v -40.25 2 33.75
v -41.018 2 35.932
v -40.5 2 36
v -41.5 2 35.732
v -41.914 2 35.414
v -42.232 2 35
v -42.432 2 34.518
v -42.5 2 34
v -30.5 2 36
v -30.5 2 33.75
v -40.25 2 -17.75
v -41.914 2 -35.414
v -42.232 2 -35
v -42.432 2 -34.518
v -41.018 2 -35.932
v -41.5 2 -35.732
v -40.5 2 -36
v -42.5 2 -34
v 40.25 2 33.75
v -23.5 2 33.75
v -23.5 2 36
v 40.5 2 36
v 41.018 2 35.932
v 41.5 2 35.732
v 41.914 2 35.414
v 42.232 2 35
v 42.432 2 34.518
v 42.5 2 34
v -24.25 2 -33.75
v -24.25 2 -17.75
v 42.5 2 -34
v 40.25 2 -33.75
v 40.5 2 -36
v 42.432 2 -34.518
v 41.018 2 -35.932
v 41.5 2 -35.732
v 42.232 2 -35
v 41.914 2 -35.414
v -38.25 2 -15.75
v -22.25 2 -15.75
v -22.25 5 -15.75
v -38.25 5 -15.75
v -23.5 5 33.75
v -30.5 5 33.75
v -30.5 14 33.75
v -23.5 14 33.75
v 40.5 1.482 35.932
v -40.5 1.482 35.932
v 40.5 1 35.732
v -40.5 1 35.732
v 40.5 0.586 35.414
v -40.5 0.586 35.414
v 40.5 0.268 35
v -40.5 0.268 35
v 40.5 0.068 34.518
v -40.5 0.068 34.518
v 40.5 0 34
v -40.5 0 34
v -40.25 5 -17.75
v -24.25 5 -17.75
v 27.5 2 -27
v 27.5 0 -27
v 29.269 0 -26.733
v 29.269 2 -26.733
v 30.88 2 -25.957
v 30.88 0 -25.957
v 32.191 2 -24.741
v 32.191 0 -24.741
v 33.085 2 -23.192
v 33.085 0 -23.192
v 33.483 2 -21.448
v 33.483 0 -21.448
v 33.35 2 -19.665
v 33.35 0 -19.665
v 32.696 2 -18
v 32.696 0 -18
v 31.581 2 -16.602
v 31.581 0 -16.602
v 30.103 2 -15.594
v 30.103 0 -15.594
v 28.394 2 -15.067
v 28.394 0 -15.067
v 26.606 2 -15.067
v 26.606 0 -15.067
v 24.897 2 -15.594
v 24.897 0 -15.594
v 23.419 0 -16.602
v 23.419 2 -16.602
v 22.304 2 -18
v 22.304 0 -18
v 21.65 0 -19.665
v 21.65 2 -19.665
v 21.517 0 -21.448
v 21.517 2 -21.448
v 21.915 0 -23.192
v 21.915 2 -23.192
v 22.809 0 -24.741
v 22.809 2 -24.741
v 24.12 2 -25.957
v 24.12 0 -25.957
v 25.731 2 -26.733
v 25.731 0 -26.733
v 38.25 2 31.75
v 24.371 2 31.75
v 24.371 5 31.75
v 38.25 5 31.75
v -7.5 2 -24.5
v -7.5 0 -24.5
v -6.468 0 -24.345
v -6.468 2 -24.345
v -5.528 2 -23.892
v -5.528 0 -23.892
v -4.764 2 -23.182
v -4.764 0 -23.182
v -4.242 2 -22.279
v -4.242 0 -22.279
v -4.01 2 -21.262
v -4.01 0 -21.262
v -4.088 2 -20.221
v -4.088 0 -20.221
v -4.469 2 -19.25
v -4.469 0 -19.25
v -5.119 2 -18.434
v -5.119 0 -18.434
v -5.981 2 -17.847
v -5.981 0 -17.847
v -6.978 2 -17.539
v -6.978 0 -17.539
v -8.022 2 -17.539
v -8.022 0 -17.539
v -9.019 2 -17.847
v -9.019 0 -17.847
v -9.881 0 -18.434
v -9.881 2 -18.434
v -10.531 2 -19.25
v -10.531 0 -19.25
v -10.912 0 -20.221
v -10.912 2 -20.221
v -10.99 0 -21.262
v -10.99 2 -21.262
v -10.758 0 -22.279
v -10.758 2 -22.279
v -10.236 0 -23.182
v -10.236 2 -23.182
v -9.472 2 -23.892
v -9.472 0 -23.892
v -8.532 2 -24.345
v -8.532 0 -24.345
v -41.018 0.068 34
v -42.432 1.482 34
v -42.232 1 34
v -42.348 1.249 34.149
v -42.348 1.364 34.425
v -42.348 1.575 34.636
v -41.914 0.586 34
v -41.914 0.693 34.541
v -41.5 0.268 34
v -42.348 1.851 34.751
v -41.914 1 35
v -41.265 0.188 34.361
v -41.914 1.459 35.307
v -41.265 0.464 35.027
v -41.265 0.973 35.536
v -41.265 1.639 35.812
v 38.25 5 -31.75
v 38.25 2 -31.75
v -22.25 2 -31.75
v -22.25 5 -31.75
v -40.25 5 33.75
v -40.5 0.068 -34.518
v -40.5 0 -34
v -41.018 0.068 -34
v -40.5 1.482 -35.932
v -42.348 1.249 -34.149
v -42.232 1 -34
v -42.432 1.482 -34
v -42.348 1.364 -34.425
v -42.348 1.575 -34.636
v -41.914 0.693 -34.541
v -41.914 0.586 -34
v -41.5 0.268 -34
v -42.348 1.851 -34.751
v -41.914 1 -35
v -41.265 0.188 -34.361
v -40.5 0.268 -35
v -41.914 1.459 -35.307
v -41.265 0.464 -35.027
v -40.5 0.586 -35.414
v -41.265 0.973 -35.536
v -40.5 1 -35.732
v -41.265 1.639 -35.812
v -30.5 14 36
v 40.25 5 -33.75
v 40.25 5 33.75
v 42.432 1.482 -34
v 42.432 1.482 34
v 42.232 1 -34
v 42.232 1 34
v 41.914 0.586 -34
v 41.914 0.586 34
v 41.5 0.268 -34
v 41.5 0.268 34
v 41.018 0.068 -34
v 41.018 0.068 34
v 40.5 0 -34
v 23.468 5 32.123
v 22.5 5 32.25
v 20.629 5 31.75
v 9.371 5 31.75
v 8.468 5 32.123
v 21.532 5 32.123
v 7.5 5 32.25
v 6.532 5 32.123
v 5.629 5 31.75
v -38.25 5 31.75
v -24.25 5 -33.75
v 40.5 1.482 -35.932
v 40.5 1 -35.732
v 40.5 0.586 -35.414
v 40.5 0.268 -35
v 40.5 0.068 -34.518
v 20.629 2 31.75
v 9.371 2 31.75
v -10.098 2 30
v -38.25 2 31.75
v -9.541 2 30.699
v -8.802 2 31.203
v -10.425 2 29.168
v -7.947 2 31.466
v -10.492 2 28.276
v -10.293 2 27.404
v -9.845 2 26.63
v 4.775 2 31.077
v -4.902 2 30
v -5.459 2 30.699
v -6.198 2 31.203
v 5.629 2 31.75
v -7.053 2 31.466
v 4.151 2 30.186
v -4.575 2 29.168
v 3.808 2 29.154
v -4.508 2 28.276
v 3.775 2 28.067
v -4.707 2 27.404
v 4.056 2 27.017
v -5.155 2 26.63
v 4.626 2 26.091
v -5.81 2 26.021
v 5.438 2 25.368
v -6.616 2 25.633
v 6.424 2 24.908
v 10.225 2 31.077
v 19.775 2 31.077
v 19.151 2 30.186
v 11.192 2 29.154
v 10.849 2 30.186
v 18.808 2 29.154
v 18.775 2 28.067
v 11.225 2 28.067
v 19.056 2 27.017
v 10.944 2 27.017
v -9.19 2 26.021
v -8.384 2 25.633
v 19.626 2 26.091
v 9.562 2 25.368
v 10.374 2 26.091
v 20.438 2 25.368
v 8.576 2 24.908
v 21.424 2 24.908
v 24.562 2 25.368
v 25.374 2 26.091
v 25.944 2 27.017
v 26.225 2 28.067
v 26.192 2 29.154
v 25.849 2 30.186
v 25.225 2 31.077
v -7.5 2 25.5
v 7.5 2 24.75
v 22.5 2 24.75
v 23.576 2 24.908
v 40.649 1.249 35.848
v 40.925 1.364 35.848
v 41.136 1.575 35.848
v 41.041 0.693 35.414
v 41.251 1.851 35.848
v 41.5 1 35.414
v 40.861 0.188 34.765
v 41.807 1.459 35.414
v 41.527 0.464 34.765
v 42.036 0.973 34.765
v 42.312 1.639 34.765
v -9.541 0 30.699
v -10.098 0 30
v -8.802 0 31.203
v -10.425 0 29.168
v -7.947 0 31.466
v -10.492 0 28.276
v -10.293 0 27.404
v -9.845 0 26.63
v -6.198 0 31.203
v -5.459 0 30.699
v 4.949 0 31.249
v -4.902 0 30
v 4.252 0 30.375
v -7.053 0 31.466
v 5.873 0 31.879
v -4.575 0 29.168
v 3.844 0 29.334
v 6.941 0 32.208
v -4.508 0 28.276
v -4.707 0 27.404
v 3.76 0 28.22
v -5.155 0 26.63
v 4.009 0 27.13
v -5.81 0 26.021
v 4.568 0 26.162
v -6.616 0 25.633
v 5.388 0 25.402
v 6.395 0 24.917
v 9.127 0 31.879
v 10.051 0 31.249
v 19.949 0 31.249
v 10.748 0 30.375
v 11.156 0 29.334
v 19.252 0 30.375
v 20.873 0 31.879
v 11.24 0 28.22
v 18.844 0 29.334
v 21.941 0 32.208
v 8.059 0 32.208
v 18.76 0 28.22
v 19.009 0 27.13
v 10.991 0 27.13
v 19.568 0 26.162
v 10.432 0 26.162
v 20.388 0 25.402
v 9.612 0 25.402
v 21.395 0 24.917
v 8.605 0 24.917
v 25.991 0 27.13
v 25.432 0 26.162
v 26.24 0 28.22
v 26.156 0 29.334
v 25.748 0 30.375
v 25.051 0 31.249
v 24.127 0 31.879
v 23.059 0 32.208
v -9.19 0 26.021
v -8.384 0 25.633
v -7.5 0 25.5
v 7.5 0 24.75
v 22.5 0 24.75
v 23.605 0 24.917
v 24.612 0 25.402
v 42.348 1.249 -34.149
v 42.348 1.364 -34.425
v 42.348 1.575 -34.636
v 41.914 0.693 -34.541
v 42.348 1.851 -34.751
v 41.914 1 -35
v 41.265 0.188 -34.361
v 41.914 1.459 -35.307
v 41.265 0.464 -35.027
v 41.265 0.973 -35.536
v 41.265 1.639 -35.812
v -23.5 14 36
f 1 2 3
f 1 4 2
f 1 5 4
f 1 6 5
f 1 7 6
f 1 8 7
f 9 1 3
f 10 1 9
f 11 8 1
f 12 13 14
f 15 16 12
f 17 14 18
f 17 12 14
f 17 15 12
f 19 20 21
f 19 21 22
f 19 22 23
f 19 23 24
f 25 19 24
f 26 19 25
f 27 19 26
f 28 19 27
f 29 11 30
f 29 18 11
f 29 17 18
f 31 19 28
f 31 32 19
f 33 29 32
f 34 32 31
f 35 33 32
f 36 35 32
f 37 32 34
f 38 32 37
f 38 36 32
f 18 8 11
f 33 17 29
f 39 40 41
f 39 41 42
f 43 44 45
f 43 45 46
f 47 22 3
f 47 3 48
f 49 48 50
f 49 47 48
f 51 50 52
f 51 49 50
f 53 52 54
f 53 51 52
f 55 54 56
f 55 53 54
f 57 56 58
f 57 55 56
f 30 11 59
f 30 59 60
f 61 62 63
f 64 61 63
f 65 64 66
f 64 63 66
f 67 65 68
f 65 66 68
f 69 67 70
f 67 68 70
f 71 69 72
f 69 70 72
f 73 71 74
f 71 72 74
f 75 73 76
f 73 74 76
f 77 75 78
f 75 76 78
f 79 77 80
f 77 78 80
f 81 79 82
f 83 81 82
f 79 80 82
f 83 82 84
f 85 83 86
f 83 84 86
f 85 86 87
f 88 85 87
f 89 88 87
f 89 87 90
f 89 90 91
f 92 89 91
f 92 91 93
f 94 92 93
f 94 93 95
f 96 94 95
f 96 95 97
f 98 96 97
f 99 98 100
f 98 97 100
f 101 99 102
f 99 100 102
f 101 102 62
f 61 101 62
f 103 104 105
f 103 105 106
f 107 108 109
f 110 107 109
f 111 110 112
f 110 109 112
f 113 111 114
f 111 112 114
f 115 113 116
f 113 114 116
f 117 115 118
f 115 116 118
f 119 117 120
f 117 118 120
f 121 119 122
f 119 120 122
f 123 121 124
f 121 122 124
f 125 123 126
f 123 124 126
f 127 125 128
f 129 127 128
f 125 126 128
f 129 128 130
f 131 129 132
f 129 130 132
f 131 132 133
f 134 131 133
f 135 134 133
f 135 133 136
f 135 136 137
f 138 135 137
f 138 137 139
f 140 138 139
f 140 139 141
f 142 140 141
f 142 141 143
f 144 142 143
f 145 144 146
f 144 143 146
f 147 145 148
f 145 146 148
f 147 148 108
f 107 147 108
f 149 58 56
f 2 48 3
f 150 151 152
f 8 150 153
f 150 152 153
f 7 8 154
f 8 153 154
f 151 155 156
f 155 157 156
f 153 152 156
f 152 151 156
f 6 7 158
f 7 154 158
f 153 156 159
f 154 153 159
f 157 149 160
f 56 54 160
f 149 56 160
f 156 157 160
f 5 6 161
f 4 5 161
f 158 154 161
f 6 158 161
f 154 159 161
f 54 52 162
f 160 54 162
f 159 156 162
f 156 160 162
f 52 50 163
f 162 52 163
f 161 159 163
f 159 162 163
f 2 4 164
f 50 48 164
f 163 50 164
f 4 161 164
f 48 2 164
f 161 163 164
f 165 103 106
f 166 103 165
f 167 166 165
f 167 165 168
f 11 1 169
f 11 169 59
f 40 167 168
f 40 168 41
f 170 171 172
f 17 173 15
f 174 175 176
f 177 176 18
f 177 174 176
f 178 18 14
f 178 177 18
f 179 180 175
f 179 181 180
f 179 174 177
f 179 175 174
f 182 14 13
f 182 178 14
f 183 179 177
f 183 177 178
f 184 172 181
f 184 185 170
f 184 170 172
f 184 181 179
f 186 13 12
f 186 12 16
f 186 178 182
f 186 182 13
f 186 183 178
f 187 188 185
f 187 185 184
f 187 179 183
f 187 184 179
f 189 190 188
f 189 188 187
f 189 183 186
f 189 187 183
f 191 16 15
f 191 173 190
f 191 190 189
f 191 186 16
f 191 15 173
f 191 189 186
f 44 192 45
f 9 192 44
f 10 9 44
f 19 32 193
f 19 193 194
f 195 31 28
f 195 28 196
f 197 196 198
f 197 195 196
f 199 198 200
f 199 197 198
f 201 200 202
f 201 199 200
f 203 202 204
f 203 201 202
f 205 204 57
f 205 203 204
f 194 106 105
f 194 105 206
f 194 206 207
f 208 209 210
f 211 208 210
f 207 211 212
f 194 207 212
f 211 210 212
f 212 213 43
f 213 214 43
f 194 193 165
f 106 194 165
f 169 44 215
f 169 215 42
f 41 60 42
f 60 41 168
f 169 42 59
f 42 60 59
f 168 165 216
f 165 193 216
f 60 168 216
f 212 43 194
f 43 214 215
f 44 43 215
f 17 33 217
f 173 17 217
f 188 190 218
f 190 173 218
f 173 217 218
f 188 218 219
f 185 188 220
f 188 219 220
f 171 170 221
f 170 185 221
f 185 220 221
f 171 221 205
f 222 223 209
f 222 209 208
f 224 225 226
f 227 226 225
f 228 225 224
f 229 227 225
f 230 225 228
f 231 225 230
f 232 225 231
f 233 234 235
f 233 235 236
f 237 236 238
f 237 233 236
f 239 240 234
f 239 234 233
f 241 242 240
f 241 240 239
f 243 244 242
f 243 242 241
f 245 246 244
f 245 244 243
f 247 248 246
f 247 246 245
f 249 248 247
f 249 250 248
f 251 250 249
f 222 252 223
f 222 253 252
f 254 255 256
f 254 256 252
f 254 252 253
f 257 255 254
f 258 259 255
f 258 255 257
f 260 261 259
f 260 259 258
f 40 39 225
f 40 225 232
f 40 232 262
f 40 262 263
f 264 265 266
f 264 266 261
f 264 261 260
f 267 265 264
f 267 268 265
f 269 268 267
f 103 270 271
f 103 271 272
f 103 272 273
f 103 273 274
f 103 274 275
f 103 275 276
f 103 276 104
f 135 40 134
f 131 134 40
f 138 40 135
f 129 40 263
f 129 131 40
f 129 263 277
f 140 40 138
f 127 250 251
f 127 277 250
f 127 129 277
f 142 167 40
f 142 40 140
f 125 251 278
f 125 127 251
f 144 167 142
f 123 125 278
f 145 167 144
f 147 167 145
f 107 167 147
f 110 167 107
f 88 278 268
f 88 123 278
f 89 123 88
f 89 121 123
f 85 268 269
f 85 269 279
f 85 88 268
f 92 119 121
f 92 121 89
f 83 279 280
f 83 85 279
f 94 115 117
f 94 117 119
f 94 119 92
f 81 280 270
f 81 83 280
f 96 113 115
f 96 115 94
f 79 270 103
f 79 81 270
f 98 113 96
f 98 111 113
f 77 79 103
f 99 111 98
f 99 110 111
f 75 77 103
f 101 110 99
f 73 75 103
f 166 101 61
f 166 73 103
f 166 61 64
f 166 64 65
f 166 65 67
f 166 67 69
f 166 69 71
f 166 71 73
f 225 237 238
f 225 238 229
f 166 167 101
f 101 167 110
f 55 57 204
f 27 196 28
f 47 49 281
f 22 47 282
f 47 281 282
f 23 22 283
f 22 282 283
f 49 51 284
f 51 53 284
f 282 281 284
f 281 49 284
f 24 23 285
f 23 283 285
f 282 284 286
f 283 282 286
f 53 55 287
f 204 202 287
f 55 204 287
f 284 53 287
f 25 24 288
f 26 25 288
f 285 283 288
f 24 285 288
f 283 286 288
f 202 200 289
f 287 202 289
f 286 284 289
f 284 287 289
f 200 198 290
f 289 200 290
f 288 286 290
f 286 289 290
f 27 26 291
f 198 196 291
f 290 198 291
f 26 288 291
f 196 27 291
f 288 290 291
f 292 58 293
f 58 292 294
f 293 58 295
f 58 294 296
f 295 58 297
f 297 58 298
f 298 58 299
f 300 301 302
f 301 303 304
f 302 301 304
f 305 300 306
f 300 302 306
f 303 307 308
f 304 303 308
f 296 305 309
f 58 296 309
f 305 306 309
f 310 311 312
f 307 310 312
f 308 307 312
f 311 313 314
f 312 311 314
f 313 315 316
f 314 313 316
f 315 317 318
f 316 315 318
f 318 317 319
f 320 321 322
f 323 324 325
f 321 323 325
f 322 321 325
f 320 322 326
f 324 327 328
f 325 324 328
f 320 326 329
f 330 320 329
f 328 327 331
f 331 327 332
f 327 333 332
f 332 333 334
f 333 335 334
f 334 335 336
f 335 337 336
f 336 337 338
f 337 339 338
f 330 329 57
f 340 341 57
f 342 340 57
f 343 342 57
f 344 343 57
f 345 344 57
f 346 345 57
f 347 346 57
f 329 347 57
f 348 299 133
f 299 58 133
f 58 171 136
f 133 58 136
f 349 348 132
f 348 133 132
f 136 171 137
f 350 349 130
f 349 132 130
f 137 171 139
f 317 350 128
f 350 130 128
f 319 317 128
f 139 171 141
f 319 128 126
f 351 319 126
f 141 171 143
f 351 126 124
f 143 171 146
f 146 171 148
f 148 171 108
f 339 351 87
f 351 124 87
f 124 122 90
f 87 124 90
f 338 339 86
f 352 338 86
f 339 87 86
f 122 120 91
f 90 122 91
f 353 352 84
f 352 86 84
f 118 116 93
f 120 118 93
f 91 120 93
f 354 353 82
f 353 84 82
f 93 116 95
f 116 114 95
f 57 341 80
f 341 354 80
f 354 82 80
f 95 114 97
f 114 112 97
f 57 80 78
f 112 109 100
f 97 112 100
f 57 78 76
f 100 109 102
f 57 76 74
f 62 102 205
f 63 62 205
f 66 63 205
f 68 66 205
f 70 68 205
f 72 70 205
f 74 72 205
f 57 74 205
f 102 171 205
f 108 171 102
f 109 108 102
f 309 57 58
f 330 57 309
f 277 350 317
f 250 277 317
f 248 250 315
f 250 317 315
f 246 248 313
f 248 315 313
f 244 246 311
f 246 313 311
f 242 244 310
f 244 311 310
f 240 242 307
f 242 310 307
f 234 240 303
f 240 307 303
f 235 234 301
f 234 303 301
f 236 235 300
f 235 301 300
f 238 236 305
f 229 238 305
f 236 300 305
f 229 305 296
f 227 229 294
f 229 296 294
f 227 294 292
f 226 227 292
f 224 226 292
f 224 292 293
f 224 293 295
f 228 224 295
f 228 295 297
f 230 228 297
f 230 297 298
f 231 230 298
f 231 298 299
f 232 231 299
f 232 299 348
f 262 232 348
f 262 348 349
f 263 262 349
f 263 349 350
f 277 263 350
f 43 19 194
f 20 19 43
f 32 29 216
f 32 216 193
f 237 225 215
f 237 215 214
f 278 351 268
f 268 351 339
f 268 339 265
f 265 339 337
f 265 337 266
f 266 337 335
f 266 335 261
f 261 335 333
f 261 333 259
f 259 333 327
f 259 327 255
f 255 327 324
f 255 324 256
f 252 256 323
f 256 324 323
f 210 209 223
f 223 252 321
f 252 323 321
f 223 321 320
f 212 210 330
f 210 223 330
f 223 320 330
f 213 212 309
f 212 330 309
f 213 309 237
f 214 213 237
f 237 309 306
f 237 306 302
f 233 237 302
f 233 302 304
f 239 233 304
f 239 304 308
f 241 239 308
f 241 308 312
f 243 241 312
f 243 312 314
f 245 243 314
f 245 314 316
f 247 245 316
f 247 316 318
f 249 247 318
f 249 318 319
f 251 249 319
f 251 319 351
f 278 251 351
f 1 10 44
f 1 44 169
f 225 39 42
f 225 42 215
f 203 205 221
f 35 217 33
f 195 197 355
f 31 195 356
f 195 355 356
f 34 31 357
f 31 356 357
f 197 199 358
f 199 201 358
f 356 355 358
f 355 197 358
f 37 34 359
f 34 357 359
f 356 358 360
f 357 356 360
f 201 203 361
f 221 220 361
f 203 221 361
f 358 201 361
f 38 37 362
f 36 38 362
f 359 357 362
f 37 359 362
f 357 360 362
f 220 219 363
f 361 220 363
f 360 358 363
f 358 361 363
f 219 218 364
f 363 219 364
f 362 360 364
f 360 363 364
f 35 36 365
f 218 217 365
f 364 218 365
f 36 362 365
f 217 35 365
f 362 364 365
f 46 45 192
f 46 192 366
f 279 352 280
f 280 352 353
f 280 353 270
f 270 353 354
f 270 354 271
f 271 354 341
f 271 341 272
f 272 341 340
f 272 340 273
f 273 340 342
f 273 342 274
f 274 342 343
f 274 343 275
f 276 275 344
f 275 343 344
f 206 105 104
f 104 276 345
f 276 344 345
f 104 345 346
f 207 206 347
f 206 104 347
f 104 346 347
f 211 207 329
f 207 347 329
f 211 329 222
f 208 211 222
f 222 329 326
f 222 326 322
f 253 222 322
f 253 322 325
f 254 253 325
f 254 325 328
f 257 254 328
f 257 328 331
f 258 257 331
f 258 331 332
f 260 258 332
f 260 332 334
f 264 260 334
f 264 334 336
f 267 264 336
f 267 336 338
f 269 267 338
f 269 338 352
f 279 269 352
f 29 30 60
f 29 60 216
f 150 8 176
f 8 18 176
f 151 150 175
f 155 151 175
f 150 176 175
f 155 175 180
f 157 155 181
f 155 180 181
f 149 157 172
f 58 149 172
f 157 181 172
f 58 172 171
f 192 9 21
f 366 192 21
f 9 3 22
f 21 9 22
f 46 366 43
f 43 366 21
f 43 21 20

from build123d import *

# Parameters (mm, degrees)
ESQUISSE1_W             = 85
ESQUISSE1_H             = 72
BOSS_EXTRU_1_DEPTH      = 2
BOSS_EXTRU_2_DEPTH      = 3
ESQUISSE3_R             = 3.75
ESQUISSE3_R_2           = 3
ENL_V_MAT_EXTRU_1_DEPTH = 56.921820428
ESQUISSE4_R             = 6
ESQUISSE4_R_2           = 3.5
ENL_V_MAT_EXTRU_2_DEPTH = 2
ESQUISSE8_W             = 7
ESQUISSE8_H             = 2.25
BOSS_EXTRU_4_DEPTH      = 12
CONG_4_R                = 2


with BuildPart() as part:
    # Esquisse1 → Boss.-Extru.1 (new body)
    with BuildSketch(Plane(origin=(0, 0, 0), x_dir=(1, 0, 0), z_dir=(0, 1, 0))):
        Rectangle(ESQUISSE1_W, ESQUISSE1_H)
    extrude(amount=BOSS_EXTRU_1_DEPTH)

    # Esquisse2 → Boss.-Extru.2 (add)
    with BuildSketch(Plane(origin=(0, 2, 0), x_dir=(1, 0, 0), z_dir=(0, 1, 0))):
        Polygon((40.25, -33.75), (-40.25, -33.75), (-40.25, 17.75), (-24.25, 17.75), (-24.25, 33.75), (40.25, 33.75), align=None)
        Polygon((-38.25, -31.75), (38.25, -31.75), (38.25, 31.75), (-22.25, 31.75), (-22.25, 15.75), (-38.25, 15.75), align=None, mode=Mode.SUBTRACT)
    extrude(amount=BOSS_EXTRU_2_DEPTH)

    # Esquisse3 → Enlèv. mat.-Extru.1 (cut, through all)
    with BuildSketch(Plane(origin=(0, 0, 0), x_dir=(-1, 0, 0), z_dir=(0, -1, 0))):
        with Locations(Location((-22.5, -28.5, 0), (0, 0, 90))):
            Circle(ESQUISSE3_R)
        with Locations(Location((-7.5, -28.5, 0), (0, 0, 90))):
            Circle(ESQUISSE3_R)
        with Locations(Location((7.5, -28.5, 0), (0, 0, 90))):
            Circle(ESQUISSE3_R_2)
    extrude(amount=-ENL_V_MAT_EXTRU_1_DEPTH, mode=Mode.SUBTRACT)

    # Esquisse4 → Enlèv. mat.-Extru.2 (cut)
    with BuildSketch(Plane(origin=(0, 0, 0), x_dir=(-1, 0, 0), z_dir=(0, -1, 0))):
        with Locations(Location((-27.5, 21, 0), (0, 0, 90))):
            Circle(ESQUISSE4_R)
        with Locations(Location((7.5, 21, 0), (0, 0, 90))):
            Circle(ESQUISSE4_R_2)
    extrude(amount=-ENL_V_MAT_EXTRU_2_DEPTH, mode=Mode.SUBTRACT)

    # Esquisse8 → Boss.-Extru.4 (add)
    with BuildSketch(Plane(origin=(0, 2, 0), x_dir=(1, 0, 0), z_dir=(0, 1, 0))):
        with Locations((-27, -34.875)):
            Rectangle(ESQUISSE8_W, ESQUISSE8_H)
    extrude(amount=BOSS_EXTRU_4_DEPTH)

    # Congé4
    cong_4_edges = [part.edges().sort_by_distance(p)[0] for p in [
        (0, 0, -36),
        (42.5, 0, 0),
        (0, 0, 36),
        (-42.5, 0, 0),
        (-42.5, 1, -36),
        (42.5, 1, -36),
        (42.5, 1, 36),
        (-42.5, 1, 36),
    ]]
    fillet(cong_4_edges, radius=CONG_4_R - 0.0001)  # a hair under: the kernel refuses the full size


solid = part.part
